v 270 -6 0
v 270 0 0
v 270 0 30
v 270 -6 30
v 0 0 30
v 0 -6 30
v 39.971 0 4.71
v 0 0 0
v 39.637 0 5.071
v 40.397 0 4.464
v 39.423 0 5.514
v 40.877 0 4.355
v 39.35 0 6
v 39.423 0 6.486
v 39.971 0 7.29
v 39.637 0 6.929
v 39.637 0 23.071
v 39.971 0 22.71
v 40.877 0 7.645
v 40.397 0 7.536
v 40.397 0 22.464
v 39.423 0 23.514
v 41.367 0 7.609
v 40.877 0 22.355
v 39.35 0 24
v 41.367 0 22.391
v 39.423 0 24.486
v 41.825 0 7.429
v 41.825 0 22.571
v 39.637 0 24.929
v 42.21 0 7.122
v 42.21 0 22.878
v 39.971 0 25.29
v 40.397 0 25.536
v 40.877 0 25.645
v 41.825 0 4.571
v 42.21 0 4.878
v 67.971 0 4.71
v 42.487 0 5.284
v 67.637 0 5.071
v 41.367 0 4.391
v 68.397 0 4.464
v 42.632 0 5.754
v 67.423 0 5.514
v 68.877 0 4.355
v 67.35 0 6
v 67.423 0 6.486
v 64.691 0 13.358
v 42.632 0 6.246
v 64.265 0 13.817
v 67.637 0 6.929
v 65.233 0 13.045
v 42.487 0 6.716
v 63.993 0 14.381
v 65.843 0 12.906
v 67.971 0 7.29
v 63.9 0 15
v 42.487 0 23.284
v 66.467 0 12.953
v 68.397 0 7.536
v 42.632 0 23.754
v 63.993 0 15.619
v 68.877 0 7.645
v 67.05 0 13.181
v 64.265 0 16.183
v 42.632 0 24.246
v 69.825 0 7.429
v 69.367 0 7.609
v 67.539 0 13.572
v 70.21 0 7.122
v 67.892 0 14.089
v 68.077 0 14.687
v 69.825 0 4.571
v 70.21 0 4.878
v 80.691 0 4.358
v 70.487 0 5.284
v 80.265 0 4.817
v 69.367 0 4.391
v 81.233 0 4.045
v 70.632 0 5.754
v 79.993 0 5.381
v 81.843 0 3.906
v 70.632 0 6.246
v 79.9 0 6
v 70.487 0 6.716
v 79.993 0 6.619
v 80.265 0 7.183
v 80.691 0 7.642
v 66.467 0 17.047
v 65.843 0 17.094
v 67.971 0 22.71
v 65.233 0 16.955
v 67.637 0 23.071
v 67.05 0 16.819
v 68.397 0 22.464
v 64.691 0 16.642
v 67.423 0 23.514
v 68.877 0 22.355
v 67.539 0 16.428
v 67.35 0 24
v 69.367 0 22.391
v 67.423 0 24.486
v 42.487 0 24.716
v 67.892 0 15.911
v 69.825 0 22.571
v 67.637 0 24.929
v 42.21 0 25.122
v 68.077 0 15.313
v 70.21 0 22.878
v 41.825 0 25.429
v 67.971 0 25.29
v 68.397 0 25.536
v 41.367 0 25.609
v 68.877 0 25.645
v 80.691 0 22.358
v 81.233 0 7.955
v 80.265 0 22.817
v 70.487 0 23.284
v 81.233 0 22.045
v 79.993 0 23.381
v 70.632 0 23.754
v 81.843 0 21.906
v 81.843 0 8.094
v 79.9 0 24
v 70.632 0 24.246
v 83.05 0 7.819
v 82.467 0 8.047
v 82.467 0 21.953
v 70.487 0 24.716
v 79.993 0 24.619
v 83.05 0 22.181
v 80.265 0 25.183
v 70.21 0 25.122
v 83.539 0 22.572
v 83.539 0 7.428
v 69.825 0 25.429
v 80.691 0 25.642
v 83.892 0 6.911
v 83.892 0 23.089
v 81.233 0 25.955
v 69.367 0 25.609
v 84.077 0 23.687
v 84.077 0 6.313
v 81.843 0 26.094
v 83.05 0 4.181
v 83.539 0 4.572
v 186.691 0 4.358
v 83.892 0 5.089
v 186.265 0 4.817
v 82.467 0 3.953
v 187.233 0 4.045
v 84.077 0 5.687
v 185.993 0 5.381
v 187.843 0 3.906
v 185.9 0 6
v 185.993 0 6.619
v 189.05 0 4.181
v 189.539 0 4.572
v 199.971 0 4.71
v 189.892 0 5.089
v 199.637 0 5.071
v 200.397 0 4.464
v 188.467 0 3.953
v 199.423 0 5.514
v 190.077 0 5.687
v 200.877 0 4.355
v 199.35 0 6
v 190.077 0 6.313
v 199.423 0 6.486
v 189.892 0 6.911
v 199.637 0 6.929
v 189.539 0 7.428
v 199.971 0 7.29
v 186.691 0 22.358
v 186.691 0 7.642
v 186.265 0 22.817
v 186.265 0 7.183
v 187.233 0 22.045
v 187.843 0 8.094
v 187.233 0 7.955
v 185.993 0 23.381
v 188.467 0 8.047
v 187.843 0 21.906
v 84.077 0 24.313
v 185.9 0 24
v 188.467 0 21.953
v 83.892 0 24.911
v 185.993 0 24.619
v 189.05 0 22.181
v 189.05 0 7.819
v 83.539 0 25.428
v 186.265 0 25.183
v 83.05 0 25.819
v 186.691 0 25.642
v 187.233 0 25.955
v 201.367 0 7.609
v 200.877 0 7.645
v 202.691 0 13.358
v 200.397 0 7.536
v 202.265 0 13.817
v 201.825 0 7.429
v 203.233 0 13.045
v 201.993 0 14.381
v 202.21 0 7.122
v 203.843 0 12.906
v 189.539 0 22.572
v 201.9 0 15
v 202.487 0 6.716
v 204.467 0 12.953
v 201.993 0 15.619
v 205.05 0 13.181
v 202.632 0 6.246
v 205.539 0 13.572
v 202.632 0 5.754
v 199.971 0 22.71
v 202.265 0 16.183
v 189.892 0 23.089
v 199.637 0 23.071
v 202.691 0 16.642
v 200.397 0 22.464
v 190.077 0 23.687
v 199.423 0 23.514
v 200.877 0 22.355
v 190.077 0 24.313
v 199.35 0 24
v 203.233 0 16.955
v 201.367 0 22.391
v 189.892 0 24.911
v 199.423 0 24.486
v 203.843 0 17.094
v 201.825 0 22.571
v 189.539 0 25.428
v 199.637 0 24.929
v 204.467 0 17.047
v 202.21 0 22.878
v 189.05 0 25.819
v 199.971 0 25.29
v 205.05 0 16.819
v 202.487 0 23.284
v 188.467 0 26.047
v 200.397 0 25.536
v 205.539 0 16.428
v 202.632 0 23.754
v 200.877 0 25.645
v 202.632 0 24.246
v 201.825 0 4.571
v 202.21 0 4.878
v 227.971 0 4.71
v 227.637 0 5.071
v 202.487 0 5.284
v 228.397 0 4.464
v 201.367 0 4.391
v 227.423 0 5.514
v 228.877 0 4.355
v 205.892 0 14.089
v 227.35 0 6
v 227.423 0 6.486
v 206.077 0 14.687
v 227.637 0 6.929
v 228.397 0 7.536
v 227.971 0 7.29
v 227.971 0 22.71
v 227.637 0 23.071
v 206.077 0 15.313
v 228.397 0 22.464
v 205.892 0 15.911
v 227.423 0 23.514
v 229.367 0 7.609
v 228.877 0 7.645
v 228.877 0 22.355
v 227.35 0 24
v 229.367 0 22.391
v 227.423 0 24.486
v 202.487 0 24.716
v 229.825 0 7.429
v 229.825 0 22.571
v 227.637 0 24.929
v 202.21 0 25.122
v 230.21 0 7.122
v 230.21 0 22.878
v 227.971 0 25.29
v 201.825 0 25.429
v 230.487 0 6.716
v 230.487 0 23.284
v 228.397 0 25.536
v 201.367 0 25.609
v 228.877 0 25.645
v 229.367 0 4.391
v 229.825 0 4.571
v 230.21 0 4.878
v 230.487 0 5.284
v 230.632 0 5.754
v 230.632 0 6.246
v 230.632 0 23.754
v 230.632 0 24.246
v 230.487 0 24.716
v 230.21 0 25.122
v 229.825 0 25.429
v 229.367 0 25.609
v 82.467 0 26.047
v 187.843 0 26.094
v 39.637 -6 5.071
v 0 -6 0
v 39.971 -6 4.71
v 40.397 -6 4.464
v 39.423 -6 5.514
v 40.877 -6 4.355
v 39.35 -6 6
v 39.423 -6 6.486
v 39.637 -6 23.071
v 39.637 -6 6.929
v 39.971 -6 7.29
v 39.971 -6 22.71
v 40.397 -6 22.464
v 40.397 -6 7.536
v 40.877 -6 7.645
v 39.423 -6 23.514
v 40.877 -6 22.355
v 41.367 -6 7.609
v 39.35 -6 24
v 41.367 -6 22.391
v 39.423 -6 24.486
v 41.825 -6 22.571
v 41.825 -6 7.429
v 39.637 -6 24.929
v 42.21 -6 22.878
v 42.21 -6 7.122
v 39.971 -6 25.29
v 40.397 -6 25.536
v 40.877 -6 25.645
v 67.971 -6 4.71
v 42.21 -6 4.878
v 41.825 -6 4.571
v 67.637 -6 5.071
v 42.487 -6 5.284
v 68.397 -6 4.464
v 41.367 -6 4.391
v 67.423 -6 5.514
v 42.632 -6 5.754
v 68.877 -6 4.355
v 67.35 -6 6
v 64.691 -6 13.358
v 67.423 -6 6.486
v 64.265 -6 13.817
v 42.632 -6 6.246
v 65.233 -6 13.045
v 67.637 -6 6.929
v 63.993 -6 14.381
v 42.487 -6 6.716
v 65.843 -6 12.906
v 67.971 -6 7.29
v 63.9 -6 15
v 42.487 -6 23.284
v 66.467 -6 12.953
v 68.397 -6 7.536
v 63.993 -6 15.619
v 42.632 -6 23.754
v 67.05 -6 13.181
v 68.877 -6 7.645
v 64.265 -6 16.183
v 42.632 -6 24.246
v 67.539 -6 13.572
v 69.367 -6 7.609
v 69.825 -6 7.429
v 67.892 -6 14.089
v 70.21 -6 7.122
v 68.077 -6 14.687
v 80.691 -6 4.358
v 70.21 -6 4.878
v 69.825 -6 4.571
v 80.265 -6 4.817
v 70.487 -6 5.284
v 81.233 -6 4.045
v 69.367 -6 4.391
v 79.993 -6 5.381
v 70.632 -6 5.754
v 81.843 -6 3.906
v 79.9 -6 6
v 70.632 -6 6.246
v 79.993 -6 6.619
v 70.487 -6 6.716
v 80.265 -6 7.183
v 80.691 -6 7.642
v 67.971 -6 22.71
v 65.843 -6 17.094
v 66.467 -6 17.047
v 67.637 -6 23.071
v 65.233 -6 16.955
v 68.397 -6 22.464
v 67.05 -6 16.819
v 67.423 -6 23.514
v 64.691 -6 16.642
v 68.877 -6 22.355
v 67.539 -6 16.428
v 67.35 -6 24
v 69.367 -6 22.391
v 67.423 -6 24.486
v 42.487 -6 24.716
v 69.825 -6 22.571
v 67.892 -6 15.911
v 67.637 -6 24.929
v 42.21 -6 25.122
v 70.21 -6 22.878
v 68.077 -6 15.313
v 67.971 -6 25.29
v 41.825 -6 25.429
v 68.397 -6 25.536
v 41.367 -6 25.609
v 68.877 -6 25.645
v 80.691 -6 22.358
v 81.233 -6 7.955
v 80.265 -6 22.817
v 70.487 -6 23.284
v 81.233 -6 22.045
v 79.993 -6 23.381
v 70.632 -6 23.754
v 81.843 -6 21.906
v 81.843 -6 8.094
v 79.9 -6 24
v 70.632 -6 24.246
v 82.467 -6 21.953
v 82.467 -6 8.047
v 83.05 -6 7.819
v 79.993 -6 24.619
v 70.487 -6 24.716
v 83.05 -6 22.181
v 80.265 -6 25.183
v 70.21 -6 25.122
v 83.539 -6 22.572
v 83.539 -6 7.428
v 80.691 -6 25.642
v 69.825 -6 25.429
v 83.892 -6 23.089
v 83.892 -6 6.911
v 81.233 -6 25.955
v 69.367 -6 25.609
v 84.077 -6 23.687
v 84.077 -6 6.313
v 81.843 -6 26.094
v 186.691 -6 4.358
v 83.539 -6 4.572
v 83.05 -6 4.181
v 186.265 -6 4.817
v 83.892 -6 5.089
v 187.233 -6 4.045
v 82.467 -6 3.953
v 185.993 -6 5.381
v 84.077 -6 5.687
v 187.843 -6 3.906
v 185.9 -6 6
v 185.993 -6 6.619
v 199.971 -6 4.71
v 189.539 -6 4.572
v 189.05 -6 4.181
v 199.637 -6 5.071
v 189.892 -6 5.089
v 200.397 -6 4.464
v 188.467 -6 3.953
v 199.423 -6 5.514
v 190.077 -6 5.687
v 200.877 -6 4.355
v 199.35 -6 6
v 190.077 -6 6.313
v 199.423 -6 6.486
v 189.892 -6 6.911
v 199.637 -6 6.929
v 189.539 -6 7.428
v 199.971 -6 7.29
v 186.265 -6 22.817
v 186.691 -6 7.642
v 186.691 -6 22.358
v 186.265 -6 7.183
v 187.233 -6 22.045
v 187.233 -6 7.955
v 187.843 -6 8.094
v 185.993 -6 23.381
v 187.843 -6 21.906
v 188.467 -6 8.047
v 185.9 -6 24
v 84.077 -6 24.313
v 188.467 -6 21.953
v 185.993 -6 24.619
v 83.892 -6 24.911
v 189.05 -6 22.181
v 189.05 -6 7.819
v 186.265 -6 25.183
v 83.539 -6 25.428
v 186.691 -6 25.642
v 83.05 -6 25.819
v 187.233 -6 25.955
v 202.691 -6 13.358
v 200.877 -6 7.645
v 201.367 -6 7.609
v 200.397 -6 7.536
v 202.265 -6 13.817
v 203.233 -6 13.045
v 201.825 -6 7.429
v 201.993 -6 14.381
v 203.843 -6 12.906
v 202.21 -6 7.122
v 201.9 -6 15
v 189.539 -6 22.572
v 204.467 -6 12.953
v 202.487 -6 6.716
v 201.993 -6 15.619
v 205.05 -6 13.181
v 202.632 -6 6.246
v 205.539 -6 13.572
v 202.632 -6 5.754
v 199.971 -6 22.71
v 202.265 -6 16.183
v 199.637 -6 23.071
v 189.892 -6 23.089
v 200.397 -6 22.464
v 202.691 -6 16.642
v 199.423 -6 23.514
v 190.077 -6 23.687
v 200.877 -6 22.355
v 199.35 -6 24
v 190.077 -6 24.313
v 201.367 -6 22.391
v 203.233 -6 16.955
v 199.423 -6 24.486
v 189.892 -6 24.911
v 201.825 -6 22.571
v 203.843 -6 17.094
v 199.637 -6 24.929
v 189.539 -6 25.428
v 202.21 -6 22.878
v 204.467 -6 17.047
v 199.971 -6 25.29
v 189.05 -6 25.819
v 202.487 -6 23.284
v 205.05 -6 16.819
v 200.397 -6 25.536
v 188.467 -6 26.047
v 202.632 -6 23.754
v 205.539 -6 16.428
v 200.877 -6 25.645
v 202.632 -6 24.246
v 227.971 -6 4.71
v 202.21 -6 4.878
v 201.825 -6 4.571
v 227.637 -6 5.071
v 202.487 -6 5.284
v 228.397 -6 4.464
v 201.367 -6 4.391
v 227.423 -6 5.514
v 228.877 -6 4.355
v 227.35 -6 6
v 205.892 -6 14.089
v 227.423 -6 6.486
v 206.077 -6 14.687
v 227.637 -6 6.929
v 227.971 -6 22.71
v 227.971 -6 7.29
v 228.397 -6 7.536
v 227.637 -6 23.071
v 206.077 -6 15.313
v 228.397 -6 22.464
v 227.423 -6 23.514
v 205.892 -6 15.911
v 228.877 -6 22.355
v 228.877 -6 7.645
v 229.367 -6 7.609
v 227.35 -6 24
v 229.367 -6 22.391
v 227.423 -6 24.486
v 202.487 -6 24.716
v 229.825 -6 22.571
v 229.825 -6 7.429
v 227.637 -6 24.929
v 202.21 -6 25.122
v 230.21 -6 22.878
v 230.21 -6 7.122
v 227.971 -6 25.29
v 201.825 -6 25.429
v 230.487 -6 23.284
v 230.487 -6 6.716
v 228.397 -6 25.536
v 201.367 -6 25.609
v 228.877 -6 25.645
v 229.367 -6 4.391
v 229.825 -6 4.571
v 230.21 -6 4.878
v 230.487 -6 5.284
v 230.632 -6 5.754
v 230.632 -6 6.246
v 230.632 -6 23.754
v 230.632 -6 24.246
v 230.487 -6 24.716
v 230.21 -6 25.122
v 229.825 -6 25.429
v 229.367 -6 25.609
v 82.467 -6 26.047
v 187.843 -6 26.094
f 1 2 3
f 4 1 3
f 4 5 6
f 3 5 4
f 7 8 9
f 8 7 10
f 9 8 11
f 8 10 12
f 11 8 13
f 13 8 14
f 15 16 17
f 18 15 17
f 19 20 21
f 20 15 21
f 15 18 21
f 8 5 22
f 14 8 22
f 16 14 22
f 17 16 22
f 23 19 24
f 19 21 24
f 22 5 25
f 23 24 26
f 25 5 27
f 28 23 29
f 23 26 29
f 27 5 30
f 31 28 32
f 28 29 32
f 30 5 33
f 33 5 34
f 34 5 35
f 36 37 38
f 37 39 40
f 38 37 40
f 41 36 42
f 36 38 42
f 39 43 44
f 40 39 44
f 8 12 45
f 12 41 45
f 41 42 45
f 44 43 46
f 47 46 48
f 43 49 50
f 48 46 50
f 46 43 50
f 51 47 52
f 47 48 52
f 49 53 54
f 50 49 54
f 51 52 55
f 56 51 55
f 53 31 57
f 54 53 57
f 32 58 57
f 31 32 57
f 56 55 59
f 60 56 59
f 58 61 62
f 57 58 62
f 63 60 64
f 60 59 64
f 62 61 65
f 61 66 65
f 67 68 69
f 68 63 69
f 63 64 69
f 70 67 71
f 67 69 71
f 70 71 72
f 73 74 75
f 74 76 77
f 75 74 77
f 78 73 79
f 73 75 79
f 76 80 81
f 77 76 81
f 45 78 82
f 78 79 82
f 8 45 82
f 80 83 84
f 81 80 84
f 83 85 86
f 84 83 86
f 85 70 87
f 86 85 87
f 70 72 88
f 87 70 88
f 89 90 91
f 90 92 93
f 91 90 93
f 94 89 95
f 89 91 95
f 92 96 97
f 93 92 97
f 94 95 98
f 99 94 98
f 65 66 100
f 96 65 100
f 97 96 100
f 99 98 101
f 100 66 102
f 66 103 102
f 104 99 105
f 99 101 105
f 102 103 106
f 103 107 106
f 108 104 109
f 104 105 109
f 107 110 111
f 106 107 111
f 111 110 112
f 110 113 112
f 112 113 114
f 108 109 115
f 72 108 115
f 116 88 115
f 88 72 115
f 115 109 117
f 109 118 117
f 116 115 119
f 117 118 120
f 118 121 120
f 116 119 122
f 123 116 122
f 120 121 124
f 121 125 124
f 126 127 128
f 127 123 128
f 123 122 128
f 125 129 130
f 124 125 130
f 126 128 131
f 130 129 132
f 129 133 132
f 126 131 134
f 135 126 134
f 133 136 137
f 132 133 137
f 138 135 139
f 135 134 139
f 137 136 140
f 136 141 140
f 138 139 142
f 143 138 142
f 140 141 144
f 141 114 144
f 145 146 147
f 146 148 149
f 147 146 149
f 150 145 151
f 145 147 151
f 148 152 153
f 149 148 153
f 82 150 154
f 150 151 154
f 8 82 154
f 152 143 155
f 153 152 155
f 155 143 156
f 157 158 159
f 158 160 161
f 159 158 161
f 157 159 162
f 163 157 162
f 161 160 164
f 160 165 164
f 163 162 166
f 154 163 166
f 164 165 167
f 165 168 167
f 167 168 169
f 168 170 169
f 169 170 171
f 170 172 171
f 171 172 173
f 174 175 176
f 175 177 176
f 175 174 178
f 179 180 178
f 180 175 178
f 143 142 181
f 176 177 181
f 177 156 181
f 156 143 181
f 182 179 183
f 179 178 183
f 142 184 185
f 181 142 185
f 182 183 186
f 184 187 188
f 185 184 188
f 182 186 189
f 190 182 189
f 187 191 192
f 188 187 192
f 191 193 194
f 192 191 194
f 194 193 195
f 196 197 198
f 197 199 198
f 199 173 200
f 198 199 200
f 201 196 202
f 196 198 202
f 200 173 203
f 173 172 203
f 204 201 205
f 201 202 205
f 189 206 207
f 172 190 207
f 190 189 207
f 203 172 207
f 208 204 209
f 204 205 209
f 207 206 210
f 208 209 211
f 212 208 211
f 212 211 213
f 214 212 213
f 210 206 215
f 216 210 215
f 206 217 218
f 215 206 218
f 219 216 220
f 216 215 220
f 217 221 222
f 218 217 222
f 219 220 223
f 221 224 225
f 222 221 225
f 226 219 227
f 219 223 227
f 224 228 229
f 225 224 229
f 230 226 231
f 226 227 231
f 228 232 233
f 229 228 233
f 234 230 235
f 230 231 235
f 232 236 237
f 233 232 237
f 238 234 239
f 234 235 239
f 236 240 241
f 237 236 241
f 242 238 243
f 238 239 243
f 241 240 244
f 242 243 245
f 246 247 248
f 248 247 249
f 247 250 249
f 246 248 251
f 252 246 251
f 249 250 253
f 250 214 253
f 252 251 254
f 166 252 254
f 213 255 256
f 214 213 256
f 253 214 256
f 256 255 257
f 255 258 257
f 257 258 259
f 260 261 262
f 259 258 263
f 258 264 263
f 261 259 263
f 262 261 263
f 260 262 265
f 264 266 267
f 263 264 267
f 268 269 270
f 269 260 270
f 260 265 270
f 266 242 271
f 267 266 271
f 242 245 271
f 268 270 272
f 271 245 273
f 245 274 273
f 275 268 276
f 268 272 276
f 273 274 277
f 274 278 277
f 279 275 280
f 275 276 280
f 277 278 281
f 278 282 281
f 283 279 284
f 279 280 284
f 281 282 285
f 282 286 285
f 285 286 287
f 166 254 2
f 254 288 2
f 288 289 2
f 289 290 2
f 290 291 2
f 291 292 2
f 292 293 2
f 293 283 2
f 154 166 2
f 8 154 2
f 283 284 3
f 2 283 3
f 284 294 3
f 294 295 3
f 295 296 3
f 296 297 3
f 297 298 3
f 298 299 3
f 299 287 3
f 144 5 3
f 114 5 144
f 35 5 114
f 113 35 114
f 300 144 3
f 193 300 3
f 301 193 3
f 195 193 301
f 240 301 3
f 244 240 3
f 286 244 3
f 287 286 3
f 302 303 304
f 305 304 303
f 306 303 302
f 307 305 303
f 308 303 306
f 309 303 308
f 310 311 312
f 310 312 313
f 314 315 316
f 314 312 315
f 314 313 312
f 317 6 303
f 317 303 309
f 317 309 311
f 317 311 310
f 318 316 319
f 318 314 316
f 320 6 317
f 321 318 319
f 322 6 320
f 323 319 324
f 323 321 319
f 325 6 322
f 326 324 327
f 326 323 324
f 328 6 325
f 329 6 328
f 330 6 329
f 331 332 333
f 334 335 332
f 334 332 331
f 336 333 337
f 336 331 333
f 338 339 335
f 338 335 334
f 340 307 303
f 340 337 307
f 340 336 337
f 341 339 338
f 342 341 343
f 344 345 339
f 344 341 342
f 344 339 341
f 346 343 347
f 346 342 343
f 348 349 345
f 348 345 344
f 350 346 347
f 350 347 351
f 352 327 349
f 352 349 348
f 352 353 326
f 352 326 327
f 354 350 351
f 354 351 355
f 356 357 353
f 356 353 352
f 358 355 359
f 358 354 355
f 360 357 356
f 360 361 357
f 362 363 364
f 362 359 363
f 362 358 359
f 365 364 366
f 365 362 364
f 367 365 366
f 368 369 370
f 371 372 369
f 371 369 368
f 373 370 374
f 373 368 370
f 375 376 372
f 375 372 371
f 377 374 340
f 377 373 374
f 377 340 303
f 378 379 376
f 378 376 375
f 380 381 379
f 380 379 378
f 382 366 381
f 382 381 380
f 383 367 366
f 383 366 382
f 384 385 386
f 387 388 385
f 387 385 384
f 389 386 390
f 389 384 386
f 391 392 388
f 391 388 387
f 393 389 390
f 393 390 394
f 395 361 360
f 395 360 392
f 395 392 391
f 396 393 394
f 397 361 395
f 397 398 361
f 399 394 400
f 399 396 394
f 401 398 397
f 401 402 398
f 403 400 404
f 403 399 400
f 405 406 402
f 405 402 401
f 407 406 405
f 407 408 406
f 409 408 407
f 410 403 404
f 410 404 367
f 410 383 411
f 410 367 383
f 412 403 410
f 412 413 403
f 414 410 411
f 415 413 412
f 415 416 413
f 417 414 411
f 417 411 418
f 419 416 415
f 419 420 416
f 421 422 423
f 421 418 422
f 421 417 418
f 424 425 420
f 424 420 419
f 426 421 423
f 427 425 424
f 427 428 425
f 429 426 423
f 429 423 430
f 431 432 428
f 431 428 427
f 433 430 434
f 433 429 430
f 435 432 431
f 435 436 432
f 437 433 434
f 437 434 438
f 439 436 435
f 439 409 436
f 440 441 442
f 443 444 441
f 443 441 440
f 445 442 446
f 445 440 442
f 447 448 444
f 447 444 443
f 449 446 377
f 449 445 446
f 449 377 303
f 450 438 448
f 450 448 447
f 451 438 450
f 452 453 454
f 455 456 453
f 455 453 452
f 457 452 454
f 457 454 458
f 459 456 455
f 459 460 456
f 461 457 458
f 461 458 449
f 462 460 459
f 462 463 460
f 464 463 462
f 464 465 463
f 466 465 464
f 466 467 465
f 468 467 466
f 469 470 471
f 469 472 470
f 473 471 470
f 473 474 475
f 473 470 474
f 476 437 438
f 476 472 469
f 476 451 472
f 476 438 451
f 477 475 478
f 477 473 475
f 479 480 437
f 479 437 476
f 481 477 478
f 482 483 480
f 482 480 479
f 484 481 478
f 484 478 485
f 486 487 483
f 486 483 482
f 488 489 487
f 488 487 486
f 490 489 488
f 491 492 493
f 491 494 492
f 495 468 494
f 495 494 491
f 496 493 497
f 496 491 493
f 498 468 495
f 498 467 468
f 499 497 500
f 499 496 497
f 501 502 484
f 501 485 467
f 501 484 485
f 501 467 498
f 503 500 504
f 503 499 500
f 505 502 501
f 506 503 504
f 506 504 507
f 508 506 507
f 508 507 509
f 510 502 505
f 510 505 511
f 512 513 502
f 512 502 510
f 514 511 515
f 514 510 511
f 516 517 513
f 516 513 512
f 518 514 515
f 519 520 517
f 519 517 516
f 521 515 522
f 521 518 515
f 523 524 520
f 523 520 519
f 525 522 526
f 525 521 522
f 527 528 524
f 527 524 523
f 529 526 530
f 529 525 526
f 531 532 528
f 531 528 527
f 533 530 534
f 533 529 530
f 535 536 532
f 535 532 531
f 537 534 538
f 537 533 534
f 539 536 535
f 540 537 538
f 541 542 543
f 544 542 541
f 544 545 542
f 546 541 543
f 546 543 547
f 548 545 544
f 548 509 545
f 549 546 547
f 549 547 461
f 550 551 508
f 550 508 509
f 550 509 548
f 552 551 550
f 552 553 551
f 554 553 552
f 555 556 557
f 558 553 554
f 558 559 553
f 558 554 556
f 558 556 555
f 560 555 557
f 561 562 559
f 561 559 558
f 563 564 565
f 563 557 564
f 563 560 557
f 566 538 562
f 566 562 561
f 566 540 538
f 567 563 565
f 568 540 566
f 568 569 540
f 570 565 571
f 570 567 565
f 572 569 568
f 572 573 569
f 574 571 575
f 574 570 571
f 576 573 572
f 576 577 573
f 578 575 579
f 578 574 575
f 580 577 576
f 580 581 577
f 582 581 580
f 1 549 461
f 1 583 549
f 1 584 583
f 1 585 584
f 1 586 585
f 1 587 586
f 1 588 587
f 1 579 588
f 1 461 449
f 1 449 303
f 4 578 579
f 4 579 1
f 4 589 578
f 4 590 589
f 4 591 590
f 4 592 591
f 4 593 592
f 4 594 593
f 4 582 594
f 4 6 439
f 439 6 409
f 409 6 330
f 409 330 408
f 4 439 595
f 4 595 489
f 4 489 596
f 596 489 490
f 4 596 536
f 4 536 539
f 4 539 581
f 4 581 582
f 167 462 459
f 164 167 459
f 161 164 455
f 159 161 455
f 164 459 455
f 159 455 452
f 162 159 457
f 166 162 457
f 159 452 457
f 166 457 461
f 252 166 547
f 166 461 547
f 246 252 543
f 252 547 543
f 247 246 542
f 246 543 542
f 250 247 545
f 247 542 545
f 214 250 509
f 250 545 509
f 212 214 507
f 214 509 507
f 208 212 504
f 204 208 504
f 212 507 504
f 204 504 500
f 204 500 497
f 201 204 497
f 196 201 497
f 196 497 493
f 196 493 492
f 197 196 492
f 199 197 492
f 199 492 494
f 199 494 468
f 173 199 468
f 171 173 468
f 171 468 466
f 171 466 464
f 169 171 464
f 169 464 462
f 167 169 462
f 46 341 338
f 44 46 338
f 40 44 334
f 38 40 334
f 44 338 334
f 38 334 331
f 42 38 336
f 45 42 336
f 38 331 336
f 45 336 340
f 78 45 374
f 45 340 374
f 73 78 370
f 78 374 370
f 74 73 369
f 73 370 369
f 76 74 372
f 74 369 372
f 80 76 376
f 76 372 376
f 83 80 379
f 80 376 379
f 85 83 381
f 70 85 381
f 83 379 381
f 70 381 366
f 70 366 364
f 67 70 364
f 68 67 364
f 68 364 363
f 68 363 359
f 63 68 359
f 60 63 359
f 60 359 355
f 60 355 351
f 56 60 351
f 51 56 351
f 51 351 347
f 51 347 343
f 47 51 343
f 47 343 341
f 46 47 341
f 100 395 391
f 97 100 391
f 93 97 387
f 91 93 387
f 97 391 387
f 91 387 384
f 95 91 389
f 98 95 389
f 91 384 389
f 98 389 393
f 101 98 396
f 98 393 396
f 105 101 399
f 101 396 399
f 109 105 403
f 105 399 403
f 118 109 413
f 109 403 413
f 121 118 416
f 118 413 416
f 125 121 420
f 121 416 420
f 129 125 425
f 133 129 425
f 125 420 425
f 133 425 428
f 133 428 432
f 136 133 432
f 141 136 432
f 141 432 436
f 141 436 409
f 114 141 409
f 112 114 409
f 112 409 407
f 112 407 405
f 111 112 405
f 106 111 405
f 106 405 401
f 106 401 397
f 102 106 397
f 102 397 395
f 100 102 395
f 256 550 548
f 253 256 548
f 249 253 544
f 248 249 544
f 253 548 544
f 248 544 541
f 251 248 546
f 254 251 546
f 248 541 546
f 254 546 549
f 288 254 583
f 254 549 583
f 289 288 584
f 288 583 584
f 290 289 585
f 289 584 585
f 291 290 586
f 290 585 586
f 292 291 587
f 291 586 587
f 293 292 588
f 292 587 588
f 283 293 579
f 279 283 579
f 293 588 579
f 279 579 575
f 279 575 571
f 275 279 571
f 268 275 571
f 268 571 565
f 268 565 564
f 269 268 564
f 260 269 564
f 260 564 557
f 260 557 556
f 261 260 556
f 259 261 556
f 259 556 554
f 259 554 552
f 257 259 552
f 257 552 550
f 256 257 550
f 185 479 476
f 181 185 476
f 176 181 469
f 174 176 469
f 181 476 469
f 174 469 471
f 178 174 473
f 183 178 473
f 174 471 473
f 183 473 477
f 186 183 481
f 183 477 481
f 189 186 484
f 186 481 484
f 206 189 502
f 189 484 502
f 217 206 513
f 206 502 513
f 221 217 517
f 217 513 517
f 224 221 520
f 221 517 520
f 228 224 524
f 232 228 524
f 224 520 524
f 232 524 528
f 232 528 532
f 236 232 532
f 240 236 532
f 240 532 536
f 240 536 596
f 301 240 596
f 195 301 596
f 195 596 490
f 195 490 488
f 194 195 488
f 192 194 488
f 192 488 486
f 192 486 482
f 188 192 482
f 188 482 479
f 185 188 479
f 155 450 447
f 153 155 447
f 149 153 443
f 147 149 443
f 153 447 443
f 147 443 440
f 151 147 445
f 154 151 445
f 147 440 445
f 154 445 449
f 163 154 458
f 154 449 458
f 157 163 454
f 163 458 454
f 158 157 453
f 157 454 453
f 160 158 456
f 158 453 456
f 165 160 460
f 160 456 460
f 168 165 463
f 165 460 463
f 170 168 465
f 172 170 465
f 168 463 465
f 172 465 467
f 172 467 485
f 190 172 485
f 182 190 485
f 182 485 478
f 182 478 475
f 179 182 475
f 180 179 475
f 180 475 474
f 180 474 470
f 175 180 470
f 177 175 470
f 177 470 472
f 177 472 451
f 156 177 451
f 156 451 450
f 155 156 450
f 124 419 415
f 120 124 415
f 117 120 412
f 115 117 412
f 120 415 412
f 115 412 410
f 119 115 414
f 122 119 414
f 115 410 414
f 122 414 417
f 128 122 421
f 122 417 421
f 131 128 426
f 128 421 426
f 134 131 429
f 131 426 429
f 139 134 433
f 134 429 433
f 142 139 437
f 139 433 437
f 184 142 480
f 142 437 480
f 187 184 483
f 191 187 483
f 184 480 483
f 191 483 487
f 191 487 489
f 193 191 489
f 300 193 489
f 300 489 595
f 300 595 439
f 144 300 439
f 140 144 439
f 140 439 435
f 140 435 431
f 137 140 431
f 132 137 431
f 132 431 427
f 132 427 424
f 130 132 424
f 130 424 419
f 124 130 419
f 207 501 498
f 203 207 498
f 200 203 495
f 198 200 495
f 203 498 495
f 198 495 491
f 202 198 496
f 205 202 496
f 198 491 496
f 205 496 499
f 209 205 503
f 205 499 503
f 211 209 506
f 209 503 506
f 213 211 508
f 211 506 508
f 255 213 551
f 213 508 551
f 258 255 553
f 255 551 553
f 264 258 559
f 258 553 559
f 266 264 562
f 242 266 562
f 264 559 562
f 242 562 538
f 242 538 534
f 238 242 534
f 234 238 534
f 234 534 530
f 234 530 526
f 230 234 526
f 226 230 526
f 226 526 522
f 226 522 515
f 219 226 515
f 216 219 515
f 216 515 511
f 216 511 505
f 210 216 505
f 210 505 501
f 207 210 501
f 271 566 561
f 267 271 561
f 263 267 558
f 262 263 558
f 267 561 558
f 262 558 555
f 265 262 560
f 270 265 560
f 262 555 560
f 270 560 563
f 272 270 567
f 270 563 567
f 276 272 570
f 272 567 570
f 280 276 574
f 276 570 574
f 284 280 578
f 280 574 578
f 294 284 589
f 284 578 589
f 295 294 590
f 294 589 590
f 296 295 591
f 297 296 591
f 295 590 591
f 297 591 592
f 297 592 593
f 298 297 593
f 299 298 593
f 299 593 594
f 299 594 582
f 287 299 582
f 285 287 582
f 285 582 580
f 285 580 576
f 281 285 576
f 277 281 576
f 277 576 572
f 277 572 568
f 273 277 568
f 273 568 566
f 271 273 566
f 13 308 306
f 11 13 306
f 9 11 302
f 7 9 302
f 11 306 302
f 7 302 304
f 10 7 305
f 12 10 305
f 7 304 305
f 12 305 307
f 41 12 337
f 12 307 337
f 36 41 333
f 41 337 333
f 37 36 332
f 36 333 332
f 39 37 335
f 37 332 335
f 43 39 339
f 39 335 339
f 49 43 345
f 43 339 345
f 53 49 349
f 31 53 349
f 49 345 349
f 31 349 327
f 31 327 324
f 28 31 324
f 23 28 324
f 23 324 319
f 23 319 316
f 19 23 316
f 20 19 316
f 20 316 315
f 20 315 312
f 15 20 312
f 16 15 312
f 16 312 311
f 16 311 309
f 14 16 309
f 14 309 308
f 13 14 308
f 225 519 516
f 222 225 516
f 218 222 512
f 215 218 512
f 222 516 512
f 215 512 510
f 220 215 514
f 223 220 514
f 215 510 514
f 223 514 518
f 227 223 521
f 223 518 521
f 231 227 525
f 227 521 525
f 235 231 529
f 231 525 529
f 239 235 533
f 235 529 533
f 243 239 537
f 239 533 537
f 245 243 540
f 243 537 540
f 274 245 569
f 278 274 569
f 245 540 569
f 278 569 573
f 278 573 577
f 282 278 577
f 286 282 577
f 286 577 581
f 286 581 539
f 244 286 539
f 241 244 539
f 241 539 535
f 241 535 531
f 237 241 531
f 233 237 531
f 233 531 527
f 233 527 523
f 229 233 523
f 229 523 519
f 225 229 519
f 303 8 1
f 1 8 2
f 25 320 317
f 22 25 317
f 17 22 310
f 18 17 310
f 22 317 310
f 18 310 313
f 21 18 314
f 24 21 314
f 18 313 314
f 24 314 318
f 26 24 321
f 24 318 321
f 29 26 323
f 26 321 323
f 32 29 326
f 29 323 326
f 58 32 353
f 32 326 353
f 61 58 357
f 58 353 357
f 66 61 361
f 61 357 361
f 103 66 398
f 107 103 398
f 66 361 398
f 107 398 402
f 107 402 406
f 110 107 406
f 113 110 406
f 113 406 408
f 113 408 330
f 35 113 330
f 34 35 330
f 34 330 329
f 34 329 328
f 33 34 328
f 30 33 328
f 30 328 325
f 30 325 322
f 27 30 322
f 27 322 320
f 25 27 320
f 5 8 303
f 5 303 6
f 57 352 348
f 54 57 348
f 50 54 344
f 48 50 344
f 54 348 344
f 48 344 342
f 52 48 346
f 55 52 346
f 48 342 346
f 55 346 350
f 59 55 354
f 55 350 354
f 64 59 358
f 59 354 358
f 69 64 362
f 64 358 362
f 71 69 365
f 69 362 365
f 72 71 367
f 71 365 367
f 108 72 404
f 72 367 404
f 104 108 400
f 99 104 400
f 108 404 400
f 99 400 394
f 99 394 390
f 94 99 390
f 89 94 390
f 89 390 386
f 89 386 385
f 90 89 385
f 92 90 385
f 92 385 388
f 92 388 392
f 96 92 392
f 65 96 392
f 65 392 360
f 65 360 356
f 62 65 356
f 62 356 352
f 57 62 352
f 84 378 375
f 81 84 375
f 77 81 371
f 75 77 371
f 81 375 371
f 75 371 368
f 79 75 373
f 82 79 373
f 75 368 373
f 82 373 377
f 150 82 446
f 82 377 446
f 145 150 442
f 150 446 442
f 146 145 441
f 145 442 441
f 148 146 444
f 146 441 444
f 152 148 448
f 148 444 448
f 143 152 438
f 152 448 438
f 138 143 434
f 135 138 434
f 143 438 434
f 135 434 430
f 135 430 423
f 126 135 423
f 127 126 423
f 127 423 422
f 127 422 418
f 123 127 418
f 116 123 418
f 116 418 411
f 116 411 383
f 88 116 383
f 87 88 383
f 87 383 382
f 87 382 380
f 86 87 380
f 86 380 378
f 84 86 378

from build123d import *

# Parameters (mm, degrees)
F0_W     = 270
F0_H     = 30
F1_DEPTH = 6
F3_D     = 4.2
F5_D     = 3.3


with BuildPart() as f1:
    # F0 (on Front) → F1 (new body)
    with BuildSketch(Plane.XZ):
        with Locations((135, 15)):
            Rectangle(F0_W, F0_H)
    extrude(amount=F1_DEPTH)

    # F3 (through all)
    with Locations(Plane(origin=(0, 0, 0), x_dir=(1, 0, 0), z_dir=(0, 1, 0))):
        with Locations((66, -15), (82, -24), (82, -6), (204, -15), (188, -24), (188, -6)):
            Hole(F3_D / 2)

    # F5 (through all)
    with Locations(Plane(origin=(0, 0, 0), x_dir=(1, 0, 0), z_dir=(0, 1, 0))):
        with Locations((41, -24), (69, -24), (69, -6), (41, -6), (201, -24), (229, -24), (229, -6), (201, -6)):
            Hole(F5_D / 2)


solid = f1.part
